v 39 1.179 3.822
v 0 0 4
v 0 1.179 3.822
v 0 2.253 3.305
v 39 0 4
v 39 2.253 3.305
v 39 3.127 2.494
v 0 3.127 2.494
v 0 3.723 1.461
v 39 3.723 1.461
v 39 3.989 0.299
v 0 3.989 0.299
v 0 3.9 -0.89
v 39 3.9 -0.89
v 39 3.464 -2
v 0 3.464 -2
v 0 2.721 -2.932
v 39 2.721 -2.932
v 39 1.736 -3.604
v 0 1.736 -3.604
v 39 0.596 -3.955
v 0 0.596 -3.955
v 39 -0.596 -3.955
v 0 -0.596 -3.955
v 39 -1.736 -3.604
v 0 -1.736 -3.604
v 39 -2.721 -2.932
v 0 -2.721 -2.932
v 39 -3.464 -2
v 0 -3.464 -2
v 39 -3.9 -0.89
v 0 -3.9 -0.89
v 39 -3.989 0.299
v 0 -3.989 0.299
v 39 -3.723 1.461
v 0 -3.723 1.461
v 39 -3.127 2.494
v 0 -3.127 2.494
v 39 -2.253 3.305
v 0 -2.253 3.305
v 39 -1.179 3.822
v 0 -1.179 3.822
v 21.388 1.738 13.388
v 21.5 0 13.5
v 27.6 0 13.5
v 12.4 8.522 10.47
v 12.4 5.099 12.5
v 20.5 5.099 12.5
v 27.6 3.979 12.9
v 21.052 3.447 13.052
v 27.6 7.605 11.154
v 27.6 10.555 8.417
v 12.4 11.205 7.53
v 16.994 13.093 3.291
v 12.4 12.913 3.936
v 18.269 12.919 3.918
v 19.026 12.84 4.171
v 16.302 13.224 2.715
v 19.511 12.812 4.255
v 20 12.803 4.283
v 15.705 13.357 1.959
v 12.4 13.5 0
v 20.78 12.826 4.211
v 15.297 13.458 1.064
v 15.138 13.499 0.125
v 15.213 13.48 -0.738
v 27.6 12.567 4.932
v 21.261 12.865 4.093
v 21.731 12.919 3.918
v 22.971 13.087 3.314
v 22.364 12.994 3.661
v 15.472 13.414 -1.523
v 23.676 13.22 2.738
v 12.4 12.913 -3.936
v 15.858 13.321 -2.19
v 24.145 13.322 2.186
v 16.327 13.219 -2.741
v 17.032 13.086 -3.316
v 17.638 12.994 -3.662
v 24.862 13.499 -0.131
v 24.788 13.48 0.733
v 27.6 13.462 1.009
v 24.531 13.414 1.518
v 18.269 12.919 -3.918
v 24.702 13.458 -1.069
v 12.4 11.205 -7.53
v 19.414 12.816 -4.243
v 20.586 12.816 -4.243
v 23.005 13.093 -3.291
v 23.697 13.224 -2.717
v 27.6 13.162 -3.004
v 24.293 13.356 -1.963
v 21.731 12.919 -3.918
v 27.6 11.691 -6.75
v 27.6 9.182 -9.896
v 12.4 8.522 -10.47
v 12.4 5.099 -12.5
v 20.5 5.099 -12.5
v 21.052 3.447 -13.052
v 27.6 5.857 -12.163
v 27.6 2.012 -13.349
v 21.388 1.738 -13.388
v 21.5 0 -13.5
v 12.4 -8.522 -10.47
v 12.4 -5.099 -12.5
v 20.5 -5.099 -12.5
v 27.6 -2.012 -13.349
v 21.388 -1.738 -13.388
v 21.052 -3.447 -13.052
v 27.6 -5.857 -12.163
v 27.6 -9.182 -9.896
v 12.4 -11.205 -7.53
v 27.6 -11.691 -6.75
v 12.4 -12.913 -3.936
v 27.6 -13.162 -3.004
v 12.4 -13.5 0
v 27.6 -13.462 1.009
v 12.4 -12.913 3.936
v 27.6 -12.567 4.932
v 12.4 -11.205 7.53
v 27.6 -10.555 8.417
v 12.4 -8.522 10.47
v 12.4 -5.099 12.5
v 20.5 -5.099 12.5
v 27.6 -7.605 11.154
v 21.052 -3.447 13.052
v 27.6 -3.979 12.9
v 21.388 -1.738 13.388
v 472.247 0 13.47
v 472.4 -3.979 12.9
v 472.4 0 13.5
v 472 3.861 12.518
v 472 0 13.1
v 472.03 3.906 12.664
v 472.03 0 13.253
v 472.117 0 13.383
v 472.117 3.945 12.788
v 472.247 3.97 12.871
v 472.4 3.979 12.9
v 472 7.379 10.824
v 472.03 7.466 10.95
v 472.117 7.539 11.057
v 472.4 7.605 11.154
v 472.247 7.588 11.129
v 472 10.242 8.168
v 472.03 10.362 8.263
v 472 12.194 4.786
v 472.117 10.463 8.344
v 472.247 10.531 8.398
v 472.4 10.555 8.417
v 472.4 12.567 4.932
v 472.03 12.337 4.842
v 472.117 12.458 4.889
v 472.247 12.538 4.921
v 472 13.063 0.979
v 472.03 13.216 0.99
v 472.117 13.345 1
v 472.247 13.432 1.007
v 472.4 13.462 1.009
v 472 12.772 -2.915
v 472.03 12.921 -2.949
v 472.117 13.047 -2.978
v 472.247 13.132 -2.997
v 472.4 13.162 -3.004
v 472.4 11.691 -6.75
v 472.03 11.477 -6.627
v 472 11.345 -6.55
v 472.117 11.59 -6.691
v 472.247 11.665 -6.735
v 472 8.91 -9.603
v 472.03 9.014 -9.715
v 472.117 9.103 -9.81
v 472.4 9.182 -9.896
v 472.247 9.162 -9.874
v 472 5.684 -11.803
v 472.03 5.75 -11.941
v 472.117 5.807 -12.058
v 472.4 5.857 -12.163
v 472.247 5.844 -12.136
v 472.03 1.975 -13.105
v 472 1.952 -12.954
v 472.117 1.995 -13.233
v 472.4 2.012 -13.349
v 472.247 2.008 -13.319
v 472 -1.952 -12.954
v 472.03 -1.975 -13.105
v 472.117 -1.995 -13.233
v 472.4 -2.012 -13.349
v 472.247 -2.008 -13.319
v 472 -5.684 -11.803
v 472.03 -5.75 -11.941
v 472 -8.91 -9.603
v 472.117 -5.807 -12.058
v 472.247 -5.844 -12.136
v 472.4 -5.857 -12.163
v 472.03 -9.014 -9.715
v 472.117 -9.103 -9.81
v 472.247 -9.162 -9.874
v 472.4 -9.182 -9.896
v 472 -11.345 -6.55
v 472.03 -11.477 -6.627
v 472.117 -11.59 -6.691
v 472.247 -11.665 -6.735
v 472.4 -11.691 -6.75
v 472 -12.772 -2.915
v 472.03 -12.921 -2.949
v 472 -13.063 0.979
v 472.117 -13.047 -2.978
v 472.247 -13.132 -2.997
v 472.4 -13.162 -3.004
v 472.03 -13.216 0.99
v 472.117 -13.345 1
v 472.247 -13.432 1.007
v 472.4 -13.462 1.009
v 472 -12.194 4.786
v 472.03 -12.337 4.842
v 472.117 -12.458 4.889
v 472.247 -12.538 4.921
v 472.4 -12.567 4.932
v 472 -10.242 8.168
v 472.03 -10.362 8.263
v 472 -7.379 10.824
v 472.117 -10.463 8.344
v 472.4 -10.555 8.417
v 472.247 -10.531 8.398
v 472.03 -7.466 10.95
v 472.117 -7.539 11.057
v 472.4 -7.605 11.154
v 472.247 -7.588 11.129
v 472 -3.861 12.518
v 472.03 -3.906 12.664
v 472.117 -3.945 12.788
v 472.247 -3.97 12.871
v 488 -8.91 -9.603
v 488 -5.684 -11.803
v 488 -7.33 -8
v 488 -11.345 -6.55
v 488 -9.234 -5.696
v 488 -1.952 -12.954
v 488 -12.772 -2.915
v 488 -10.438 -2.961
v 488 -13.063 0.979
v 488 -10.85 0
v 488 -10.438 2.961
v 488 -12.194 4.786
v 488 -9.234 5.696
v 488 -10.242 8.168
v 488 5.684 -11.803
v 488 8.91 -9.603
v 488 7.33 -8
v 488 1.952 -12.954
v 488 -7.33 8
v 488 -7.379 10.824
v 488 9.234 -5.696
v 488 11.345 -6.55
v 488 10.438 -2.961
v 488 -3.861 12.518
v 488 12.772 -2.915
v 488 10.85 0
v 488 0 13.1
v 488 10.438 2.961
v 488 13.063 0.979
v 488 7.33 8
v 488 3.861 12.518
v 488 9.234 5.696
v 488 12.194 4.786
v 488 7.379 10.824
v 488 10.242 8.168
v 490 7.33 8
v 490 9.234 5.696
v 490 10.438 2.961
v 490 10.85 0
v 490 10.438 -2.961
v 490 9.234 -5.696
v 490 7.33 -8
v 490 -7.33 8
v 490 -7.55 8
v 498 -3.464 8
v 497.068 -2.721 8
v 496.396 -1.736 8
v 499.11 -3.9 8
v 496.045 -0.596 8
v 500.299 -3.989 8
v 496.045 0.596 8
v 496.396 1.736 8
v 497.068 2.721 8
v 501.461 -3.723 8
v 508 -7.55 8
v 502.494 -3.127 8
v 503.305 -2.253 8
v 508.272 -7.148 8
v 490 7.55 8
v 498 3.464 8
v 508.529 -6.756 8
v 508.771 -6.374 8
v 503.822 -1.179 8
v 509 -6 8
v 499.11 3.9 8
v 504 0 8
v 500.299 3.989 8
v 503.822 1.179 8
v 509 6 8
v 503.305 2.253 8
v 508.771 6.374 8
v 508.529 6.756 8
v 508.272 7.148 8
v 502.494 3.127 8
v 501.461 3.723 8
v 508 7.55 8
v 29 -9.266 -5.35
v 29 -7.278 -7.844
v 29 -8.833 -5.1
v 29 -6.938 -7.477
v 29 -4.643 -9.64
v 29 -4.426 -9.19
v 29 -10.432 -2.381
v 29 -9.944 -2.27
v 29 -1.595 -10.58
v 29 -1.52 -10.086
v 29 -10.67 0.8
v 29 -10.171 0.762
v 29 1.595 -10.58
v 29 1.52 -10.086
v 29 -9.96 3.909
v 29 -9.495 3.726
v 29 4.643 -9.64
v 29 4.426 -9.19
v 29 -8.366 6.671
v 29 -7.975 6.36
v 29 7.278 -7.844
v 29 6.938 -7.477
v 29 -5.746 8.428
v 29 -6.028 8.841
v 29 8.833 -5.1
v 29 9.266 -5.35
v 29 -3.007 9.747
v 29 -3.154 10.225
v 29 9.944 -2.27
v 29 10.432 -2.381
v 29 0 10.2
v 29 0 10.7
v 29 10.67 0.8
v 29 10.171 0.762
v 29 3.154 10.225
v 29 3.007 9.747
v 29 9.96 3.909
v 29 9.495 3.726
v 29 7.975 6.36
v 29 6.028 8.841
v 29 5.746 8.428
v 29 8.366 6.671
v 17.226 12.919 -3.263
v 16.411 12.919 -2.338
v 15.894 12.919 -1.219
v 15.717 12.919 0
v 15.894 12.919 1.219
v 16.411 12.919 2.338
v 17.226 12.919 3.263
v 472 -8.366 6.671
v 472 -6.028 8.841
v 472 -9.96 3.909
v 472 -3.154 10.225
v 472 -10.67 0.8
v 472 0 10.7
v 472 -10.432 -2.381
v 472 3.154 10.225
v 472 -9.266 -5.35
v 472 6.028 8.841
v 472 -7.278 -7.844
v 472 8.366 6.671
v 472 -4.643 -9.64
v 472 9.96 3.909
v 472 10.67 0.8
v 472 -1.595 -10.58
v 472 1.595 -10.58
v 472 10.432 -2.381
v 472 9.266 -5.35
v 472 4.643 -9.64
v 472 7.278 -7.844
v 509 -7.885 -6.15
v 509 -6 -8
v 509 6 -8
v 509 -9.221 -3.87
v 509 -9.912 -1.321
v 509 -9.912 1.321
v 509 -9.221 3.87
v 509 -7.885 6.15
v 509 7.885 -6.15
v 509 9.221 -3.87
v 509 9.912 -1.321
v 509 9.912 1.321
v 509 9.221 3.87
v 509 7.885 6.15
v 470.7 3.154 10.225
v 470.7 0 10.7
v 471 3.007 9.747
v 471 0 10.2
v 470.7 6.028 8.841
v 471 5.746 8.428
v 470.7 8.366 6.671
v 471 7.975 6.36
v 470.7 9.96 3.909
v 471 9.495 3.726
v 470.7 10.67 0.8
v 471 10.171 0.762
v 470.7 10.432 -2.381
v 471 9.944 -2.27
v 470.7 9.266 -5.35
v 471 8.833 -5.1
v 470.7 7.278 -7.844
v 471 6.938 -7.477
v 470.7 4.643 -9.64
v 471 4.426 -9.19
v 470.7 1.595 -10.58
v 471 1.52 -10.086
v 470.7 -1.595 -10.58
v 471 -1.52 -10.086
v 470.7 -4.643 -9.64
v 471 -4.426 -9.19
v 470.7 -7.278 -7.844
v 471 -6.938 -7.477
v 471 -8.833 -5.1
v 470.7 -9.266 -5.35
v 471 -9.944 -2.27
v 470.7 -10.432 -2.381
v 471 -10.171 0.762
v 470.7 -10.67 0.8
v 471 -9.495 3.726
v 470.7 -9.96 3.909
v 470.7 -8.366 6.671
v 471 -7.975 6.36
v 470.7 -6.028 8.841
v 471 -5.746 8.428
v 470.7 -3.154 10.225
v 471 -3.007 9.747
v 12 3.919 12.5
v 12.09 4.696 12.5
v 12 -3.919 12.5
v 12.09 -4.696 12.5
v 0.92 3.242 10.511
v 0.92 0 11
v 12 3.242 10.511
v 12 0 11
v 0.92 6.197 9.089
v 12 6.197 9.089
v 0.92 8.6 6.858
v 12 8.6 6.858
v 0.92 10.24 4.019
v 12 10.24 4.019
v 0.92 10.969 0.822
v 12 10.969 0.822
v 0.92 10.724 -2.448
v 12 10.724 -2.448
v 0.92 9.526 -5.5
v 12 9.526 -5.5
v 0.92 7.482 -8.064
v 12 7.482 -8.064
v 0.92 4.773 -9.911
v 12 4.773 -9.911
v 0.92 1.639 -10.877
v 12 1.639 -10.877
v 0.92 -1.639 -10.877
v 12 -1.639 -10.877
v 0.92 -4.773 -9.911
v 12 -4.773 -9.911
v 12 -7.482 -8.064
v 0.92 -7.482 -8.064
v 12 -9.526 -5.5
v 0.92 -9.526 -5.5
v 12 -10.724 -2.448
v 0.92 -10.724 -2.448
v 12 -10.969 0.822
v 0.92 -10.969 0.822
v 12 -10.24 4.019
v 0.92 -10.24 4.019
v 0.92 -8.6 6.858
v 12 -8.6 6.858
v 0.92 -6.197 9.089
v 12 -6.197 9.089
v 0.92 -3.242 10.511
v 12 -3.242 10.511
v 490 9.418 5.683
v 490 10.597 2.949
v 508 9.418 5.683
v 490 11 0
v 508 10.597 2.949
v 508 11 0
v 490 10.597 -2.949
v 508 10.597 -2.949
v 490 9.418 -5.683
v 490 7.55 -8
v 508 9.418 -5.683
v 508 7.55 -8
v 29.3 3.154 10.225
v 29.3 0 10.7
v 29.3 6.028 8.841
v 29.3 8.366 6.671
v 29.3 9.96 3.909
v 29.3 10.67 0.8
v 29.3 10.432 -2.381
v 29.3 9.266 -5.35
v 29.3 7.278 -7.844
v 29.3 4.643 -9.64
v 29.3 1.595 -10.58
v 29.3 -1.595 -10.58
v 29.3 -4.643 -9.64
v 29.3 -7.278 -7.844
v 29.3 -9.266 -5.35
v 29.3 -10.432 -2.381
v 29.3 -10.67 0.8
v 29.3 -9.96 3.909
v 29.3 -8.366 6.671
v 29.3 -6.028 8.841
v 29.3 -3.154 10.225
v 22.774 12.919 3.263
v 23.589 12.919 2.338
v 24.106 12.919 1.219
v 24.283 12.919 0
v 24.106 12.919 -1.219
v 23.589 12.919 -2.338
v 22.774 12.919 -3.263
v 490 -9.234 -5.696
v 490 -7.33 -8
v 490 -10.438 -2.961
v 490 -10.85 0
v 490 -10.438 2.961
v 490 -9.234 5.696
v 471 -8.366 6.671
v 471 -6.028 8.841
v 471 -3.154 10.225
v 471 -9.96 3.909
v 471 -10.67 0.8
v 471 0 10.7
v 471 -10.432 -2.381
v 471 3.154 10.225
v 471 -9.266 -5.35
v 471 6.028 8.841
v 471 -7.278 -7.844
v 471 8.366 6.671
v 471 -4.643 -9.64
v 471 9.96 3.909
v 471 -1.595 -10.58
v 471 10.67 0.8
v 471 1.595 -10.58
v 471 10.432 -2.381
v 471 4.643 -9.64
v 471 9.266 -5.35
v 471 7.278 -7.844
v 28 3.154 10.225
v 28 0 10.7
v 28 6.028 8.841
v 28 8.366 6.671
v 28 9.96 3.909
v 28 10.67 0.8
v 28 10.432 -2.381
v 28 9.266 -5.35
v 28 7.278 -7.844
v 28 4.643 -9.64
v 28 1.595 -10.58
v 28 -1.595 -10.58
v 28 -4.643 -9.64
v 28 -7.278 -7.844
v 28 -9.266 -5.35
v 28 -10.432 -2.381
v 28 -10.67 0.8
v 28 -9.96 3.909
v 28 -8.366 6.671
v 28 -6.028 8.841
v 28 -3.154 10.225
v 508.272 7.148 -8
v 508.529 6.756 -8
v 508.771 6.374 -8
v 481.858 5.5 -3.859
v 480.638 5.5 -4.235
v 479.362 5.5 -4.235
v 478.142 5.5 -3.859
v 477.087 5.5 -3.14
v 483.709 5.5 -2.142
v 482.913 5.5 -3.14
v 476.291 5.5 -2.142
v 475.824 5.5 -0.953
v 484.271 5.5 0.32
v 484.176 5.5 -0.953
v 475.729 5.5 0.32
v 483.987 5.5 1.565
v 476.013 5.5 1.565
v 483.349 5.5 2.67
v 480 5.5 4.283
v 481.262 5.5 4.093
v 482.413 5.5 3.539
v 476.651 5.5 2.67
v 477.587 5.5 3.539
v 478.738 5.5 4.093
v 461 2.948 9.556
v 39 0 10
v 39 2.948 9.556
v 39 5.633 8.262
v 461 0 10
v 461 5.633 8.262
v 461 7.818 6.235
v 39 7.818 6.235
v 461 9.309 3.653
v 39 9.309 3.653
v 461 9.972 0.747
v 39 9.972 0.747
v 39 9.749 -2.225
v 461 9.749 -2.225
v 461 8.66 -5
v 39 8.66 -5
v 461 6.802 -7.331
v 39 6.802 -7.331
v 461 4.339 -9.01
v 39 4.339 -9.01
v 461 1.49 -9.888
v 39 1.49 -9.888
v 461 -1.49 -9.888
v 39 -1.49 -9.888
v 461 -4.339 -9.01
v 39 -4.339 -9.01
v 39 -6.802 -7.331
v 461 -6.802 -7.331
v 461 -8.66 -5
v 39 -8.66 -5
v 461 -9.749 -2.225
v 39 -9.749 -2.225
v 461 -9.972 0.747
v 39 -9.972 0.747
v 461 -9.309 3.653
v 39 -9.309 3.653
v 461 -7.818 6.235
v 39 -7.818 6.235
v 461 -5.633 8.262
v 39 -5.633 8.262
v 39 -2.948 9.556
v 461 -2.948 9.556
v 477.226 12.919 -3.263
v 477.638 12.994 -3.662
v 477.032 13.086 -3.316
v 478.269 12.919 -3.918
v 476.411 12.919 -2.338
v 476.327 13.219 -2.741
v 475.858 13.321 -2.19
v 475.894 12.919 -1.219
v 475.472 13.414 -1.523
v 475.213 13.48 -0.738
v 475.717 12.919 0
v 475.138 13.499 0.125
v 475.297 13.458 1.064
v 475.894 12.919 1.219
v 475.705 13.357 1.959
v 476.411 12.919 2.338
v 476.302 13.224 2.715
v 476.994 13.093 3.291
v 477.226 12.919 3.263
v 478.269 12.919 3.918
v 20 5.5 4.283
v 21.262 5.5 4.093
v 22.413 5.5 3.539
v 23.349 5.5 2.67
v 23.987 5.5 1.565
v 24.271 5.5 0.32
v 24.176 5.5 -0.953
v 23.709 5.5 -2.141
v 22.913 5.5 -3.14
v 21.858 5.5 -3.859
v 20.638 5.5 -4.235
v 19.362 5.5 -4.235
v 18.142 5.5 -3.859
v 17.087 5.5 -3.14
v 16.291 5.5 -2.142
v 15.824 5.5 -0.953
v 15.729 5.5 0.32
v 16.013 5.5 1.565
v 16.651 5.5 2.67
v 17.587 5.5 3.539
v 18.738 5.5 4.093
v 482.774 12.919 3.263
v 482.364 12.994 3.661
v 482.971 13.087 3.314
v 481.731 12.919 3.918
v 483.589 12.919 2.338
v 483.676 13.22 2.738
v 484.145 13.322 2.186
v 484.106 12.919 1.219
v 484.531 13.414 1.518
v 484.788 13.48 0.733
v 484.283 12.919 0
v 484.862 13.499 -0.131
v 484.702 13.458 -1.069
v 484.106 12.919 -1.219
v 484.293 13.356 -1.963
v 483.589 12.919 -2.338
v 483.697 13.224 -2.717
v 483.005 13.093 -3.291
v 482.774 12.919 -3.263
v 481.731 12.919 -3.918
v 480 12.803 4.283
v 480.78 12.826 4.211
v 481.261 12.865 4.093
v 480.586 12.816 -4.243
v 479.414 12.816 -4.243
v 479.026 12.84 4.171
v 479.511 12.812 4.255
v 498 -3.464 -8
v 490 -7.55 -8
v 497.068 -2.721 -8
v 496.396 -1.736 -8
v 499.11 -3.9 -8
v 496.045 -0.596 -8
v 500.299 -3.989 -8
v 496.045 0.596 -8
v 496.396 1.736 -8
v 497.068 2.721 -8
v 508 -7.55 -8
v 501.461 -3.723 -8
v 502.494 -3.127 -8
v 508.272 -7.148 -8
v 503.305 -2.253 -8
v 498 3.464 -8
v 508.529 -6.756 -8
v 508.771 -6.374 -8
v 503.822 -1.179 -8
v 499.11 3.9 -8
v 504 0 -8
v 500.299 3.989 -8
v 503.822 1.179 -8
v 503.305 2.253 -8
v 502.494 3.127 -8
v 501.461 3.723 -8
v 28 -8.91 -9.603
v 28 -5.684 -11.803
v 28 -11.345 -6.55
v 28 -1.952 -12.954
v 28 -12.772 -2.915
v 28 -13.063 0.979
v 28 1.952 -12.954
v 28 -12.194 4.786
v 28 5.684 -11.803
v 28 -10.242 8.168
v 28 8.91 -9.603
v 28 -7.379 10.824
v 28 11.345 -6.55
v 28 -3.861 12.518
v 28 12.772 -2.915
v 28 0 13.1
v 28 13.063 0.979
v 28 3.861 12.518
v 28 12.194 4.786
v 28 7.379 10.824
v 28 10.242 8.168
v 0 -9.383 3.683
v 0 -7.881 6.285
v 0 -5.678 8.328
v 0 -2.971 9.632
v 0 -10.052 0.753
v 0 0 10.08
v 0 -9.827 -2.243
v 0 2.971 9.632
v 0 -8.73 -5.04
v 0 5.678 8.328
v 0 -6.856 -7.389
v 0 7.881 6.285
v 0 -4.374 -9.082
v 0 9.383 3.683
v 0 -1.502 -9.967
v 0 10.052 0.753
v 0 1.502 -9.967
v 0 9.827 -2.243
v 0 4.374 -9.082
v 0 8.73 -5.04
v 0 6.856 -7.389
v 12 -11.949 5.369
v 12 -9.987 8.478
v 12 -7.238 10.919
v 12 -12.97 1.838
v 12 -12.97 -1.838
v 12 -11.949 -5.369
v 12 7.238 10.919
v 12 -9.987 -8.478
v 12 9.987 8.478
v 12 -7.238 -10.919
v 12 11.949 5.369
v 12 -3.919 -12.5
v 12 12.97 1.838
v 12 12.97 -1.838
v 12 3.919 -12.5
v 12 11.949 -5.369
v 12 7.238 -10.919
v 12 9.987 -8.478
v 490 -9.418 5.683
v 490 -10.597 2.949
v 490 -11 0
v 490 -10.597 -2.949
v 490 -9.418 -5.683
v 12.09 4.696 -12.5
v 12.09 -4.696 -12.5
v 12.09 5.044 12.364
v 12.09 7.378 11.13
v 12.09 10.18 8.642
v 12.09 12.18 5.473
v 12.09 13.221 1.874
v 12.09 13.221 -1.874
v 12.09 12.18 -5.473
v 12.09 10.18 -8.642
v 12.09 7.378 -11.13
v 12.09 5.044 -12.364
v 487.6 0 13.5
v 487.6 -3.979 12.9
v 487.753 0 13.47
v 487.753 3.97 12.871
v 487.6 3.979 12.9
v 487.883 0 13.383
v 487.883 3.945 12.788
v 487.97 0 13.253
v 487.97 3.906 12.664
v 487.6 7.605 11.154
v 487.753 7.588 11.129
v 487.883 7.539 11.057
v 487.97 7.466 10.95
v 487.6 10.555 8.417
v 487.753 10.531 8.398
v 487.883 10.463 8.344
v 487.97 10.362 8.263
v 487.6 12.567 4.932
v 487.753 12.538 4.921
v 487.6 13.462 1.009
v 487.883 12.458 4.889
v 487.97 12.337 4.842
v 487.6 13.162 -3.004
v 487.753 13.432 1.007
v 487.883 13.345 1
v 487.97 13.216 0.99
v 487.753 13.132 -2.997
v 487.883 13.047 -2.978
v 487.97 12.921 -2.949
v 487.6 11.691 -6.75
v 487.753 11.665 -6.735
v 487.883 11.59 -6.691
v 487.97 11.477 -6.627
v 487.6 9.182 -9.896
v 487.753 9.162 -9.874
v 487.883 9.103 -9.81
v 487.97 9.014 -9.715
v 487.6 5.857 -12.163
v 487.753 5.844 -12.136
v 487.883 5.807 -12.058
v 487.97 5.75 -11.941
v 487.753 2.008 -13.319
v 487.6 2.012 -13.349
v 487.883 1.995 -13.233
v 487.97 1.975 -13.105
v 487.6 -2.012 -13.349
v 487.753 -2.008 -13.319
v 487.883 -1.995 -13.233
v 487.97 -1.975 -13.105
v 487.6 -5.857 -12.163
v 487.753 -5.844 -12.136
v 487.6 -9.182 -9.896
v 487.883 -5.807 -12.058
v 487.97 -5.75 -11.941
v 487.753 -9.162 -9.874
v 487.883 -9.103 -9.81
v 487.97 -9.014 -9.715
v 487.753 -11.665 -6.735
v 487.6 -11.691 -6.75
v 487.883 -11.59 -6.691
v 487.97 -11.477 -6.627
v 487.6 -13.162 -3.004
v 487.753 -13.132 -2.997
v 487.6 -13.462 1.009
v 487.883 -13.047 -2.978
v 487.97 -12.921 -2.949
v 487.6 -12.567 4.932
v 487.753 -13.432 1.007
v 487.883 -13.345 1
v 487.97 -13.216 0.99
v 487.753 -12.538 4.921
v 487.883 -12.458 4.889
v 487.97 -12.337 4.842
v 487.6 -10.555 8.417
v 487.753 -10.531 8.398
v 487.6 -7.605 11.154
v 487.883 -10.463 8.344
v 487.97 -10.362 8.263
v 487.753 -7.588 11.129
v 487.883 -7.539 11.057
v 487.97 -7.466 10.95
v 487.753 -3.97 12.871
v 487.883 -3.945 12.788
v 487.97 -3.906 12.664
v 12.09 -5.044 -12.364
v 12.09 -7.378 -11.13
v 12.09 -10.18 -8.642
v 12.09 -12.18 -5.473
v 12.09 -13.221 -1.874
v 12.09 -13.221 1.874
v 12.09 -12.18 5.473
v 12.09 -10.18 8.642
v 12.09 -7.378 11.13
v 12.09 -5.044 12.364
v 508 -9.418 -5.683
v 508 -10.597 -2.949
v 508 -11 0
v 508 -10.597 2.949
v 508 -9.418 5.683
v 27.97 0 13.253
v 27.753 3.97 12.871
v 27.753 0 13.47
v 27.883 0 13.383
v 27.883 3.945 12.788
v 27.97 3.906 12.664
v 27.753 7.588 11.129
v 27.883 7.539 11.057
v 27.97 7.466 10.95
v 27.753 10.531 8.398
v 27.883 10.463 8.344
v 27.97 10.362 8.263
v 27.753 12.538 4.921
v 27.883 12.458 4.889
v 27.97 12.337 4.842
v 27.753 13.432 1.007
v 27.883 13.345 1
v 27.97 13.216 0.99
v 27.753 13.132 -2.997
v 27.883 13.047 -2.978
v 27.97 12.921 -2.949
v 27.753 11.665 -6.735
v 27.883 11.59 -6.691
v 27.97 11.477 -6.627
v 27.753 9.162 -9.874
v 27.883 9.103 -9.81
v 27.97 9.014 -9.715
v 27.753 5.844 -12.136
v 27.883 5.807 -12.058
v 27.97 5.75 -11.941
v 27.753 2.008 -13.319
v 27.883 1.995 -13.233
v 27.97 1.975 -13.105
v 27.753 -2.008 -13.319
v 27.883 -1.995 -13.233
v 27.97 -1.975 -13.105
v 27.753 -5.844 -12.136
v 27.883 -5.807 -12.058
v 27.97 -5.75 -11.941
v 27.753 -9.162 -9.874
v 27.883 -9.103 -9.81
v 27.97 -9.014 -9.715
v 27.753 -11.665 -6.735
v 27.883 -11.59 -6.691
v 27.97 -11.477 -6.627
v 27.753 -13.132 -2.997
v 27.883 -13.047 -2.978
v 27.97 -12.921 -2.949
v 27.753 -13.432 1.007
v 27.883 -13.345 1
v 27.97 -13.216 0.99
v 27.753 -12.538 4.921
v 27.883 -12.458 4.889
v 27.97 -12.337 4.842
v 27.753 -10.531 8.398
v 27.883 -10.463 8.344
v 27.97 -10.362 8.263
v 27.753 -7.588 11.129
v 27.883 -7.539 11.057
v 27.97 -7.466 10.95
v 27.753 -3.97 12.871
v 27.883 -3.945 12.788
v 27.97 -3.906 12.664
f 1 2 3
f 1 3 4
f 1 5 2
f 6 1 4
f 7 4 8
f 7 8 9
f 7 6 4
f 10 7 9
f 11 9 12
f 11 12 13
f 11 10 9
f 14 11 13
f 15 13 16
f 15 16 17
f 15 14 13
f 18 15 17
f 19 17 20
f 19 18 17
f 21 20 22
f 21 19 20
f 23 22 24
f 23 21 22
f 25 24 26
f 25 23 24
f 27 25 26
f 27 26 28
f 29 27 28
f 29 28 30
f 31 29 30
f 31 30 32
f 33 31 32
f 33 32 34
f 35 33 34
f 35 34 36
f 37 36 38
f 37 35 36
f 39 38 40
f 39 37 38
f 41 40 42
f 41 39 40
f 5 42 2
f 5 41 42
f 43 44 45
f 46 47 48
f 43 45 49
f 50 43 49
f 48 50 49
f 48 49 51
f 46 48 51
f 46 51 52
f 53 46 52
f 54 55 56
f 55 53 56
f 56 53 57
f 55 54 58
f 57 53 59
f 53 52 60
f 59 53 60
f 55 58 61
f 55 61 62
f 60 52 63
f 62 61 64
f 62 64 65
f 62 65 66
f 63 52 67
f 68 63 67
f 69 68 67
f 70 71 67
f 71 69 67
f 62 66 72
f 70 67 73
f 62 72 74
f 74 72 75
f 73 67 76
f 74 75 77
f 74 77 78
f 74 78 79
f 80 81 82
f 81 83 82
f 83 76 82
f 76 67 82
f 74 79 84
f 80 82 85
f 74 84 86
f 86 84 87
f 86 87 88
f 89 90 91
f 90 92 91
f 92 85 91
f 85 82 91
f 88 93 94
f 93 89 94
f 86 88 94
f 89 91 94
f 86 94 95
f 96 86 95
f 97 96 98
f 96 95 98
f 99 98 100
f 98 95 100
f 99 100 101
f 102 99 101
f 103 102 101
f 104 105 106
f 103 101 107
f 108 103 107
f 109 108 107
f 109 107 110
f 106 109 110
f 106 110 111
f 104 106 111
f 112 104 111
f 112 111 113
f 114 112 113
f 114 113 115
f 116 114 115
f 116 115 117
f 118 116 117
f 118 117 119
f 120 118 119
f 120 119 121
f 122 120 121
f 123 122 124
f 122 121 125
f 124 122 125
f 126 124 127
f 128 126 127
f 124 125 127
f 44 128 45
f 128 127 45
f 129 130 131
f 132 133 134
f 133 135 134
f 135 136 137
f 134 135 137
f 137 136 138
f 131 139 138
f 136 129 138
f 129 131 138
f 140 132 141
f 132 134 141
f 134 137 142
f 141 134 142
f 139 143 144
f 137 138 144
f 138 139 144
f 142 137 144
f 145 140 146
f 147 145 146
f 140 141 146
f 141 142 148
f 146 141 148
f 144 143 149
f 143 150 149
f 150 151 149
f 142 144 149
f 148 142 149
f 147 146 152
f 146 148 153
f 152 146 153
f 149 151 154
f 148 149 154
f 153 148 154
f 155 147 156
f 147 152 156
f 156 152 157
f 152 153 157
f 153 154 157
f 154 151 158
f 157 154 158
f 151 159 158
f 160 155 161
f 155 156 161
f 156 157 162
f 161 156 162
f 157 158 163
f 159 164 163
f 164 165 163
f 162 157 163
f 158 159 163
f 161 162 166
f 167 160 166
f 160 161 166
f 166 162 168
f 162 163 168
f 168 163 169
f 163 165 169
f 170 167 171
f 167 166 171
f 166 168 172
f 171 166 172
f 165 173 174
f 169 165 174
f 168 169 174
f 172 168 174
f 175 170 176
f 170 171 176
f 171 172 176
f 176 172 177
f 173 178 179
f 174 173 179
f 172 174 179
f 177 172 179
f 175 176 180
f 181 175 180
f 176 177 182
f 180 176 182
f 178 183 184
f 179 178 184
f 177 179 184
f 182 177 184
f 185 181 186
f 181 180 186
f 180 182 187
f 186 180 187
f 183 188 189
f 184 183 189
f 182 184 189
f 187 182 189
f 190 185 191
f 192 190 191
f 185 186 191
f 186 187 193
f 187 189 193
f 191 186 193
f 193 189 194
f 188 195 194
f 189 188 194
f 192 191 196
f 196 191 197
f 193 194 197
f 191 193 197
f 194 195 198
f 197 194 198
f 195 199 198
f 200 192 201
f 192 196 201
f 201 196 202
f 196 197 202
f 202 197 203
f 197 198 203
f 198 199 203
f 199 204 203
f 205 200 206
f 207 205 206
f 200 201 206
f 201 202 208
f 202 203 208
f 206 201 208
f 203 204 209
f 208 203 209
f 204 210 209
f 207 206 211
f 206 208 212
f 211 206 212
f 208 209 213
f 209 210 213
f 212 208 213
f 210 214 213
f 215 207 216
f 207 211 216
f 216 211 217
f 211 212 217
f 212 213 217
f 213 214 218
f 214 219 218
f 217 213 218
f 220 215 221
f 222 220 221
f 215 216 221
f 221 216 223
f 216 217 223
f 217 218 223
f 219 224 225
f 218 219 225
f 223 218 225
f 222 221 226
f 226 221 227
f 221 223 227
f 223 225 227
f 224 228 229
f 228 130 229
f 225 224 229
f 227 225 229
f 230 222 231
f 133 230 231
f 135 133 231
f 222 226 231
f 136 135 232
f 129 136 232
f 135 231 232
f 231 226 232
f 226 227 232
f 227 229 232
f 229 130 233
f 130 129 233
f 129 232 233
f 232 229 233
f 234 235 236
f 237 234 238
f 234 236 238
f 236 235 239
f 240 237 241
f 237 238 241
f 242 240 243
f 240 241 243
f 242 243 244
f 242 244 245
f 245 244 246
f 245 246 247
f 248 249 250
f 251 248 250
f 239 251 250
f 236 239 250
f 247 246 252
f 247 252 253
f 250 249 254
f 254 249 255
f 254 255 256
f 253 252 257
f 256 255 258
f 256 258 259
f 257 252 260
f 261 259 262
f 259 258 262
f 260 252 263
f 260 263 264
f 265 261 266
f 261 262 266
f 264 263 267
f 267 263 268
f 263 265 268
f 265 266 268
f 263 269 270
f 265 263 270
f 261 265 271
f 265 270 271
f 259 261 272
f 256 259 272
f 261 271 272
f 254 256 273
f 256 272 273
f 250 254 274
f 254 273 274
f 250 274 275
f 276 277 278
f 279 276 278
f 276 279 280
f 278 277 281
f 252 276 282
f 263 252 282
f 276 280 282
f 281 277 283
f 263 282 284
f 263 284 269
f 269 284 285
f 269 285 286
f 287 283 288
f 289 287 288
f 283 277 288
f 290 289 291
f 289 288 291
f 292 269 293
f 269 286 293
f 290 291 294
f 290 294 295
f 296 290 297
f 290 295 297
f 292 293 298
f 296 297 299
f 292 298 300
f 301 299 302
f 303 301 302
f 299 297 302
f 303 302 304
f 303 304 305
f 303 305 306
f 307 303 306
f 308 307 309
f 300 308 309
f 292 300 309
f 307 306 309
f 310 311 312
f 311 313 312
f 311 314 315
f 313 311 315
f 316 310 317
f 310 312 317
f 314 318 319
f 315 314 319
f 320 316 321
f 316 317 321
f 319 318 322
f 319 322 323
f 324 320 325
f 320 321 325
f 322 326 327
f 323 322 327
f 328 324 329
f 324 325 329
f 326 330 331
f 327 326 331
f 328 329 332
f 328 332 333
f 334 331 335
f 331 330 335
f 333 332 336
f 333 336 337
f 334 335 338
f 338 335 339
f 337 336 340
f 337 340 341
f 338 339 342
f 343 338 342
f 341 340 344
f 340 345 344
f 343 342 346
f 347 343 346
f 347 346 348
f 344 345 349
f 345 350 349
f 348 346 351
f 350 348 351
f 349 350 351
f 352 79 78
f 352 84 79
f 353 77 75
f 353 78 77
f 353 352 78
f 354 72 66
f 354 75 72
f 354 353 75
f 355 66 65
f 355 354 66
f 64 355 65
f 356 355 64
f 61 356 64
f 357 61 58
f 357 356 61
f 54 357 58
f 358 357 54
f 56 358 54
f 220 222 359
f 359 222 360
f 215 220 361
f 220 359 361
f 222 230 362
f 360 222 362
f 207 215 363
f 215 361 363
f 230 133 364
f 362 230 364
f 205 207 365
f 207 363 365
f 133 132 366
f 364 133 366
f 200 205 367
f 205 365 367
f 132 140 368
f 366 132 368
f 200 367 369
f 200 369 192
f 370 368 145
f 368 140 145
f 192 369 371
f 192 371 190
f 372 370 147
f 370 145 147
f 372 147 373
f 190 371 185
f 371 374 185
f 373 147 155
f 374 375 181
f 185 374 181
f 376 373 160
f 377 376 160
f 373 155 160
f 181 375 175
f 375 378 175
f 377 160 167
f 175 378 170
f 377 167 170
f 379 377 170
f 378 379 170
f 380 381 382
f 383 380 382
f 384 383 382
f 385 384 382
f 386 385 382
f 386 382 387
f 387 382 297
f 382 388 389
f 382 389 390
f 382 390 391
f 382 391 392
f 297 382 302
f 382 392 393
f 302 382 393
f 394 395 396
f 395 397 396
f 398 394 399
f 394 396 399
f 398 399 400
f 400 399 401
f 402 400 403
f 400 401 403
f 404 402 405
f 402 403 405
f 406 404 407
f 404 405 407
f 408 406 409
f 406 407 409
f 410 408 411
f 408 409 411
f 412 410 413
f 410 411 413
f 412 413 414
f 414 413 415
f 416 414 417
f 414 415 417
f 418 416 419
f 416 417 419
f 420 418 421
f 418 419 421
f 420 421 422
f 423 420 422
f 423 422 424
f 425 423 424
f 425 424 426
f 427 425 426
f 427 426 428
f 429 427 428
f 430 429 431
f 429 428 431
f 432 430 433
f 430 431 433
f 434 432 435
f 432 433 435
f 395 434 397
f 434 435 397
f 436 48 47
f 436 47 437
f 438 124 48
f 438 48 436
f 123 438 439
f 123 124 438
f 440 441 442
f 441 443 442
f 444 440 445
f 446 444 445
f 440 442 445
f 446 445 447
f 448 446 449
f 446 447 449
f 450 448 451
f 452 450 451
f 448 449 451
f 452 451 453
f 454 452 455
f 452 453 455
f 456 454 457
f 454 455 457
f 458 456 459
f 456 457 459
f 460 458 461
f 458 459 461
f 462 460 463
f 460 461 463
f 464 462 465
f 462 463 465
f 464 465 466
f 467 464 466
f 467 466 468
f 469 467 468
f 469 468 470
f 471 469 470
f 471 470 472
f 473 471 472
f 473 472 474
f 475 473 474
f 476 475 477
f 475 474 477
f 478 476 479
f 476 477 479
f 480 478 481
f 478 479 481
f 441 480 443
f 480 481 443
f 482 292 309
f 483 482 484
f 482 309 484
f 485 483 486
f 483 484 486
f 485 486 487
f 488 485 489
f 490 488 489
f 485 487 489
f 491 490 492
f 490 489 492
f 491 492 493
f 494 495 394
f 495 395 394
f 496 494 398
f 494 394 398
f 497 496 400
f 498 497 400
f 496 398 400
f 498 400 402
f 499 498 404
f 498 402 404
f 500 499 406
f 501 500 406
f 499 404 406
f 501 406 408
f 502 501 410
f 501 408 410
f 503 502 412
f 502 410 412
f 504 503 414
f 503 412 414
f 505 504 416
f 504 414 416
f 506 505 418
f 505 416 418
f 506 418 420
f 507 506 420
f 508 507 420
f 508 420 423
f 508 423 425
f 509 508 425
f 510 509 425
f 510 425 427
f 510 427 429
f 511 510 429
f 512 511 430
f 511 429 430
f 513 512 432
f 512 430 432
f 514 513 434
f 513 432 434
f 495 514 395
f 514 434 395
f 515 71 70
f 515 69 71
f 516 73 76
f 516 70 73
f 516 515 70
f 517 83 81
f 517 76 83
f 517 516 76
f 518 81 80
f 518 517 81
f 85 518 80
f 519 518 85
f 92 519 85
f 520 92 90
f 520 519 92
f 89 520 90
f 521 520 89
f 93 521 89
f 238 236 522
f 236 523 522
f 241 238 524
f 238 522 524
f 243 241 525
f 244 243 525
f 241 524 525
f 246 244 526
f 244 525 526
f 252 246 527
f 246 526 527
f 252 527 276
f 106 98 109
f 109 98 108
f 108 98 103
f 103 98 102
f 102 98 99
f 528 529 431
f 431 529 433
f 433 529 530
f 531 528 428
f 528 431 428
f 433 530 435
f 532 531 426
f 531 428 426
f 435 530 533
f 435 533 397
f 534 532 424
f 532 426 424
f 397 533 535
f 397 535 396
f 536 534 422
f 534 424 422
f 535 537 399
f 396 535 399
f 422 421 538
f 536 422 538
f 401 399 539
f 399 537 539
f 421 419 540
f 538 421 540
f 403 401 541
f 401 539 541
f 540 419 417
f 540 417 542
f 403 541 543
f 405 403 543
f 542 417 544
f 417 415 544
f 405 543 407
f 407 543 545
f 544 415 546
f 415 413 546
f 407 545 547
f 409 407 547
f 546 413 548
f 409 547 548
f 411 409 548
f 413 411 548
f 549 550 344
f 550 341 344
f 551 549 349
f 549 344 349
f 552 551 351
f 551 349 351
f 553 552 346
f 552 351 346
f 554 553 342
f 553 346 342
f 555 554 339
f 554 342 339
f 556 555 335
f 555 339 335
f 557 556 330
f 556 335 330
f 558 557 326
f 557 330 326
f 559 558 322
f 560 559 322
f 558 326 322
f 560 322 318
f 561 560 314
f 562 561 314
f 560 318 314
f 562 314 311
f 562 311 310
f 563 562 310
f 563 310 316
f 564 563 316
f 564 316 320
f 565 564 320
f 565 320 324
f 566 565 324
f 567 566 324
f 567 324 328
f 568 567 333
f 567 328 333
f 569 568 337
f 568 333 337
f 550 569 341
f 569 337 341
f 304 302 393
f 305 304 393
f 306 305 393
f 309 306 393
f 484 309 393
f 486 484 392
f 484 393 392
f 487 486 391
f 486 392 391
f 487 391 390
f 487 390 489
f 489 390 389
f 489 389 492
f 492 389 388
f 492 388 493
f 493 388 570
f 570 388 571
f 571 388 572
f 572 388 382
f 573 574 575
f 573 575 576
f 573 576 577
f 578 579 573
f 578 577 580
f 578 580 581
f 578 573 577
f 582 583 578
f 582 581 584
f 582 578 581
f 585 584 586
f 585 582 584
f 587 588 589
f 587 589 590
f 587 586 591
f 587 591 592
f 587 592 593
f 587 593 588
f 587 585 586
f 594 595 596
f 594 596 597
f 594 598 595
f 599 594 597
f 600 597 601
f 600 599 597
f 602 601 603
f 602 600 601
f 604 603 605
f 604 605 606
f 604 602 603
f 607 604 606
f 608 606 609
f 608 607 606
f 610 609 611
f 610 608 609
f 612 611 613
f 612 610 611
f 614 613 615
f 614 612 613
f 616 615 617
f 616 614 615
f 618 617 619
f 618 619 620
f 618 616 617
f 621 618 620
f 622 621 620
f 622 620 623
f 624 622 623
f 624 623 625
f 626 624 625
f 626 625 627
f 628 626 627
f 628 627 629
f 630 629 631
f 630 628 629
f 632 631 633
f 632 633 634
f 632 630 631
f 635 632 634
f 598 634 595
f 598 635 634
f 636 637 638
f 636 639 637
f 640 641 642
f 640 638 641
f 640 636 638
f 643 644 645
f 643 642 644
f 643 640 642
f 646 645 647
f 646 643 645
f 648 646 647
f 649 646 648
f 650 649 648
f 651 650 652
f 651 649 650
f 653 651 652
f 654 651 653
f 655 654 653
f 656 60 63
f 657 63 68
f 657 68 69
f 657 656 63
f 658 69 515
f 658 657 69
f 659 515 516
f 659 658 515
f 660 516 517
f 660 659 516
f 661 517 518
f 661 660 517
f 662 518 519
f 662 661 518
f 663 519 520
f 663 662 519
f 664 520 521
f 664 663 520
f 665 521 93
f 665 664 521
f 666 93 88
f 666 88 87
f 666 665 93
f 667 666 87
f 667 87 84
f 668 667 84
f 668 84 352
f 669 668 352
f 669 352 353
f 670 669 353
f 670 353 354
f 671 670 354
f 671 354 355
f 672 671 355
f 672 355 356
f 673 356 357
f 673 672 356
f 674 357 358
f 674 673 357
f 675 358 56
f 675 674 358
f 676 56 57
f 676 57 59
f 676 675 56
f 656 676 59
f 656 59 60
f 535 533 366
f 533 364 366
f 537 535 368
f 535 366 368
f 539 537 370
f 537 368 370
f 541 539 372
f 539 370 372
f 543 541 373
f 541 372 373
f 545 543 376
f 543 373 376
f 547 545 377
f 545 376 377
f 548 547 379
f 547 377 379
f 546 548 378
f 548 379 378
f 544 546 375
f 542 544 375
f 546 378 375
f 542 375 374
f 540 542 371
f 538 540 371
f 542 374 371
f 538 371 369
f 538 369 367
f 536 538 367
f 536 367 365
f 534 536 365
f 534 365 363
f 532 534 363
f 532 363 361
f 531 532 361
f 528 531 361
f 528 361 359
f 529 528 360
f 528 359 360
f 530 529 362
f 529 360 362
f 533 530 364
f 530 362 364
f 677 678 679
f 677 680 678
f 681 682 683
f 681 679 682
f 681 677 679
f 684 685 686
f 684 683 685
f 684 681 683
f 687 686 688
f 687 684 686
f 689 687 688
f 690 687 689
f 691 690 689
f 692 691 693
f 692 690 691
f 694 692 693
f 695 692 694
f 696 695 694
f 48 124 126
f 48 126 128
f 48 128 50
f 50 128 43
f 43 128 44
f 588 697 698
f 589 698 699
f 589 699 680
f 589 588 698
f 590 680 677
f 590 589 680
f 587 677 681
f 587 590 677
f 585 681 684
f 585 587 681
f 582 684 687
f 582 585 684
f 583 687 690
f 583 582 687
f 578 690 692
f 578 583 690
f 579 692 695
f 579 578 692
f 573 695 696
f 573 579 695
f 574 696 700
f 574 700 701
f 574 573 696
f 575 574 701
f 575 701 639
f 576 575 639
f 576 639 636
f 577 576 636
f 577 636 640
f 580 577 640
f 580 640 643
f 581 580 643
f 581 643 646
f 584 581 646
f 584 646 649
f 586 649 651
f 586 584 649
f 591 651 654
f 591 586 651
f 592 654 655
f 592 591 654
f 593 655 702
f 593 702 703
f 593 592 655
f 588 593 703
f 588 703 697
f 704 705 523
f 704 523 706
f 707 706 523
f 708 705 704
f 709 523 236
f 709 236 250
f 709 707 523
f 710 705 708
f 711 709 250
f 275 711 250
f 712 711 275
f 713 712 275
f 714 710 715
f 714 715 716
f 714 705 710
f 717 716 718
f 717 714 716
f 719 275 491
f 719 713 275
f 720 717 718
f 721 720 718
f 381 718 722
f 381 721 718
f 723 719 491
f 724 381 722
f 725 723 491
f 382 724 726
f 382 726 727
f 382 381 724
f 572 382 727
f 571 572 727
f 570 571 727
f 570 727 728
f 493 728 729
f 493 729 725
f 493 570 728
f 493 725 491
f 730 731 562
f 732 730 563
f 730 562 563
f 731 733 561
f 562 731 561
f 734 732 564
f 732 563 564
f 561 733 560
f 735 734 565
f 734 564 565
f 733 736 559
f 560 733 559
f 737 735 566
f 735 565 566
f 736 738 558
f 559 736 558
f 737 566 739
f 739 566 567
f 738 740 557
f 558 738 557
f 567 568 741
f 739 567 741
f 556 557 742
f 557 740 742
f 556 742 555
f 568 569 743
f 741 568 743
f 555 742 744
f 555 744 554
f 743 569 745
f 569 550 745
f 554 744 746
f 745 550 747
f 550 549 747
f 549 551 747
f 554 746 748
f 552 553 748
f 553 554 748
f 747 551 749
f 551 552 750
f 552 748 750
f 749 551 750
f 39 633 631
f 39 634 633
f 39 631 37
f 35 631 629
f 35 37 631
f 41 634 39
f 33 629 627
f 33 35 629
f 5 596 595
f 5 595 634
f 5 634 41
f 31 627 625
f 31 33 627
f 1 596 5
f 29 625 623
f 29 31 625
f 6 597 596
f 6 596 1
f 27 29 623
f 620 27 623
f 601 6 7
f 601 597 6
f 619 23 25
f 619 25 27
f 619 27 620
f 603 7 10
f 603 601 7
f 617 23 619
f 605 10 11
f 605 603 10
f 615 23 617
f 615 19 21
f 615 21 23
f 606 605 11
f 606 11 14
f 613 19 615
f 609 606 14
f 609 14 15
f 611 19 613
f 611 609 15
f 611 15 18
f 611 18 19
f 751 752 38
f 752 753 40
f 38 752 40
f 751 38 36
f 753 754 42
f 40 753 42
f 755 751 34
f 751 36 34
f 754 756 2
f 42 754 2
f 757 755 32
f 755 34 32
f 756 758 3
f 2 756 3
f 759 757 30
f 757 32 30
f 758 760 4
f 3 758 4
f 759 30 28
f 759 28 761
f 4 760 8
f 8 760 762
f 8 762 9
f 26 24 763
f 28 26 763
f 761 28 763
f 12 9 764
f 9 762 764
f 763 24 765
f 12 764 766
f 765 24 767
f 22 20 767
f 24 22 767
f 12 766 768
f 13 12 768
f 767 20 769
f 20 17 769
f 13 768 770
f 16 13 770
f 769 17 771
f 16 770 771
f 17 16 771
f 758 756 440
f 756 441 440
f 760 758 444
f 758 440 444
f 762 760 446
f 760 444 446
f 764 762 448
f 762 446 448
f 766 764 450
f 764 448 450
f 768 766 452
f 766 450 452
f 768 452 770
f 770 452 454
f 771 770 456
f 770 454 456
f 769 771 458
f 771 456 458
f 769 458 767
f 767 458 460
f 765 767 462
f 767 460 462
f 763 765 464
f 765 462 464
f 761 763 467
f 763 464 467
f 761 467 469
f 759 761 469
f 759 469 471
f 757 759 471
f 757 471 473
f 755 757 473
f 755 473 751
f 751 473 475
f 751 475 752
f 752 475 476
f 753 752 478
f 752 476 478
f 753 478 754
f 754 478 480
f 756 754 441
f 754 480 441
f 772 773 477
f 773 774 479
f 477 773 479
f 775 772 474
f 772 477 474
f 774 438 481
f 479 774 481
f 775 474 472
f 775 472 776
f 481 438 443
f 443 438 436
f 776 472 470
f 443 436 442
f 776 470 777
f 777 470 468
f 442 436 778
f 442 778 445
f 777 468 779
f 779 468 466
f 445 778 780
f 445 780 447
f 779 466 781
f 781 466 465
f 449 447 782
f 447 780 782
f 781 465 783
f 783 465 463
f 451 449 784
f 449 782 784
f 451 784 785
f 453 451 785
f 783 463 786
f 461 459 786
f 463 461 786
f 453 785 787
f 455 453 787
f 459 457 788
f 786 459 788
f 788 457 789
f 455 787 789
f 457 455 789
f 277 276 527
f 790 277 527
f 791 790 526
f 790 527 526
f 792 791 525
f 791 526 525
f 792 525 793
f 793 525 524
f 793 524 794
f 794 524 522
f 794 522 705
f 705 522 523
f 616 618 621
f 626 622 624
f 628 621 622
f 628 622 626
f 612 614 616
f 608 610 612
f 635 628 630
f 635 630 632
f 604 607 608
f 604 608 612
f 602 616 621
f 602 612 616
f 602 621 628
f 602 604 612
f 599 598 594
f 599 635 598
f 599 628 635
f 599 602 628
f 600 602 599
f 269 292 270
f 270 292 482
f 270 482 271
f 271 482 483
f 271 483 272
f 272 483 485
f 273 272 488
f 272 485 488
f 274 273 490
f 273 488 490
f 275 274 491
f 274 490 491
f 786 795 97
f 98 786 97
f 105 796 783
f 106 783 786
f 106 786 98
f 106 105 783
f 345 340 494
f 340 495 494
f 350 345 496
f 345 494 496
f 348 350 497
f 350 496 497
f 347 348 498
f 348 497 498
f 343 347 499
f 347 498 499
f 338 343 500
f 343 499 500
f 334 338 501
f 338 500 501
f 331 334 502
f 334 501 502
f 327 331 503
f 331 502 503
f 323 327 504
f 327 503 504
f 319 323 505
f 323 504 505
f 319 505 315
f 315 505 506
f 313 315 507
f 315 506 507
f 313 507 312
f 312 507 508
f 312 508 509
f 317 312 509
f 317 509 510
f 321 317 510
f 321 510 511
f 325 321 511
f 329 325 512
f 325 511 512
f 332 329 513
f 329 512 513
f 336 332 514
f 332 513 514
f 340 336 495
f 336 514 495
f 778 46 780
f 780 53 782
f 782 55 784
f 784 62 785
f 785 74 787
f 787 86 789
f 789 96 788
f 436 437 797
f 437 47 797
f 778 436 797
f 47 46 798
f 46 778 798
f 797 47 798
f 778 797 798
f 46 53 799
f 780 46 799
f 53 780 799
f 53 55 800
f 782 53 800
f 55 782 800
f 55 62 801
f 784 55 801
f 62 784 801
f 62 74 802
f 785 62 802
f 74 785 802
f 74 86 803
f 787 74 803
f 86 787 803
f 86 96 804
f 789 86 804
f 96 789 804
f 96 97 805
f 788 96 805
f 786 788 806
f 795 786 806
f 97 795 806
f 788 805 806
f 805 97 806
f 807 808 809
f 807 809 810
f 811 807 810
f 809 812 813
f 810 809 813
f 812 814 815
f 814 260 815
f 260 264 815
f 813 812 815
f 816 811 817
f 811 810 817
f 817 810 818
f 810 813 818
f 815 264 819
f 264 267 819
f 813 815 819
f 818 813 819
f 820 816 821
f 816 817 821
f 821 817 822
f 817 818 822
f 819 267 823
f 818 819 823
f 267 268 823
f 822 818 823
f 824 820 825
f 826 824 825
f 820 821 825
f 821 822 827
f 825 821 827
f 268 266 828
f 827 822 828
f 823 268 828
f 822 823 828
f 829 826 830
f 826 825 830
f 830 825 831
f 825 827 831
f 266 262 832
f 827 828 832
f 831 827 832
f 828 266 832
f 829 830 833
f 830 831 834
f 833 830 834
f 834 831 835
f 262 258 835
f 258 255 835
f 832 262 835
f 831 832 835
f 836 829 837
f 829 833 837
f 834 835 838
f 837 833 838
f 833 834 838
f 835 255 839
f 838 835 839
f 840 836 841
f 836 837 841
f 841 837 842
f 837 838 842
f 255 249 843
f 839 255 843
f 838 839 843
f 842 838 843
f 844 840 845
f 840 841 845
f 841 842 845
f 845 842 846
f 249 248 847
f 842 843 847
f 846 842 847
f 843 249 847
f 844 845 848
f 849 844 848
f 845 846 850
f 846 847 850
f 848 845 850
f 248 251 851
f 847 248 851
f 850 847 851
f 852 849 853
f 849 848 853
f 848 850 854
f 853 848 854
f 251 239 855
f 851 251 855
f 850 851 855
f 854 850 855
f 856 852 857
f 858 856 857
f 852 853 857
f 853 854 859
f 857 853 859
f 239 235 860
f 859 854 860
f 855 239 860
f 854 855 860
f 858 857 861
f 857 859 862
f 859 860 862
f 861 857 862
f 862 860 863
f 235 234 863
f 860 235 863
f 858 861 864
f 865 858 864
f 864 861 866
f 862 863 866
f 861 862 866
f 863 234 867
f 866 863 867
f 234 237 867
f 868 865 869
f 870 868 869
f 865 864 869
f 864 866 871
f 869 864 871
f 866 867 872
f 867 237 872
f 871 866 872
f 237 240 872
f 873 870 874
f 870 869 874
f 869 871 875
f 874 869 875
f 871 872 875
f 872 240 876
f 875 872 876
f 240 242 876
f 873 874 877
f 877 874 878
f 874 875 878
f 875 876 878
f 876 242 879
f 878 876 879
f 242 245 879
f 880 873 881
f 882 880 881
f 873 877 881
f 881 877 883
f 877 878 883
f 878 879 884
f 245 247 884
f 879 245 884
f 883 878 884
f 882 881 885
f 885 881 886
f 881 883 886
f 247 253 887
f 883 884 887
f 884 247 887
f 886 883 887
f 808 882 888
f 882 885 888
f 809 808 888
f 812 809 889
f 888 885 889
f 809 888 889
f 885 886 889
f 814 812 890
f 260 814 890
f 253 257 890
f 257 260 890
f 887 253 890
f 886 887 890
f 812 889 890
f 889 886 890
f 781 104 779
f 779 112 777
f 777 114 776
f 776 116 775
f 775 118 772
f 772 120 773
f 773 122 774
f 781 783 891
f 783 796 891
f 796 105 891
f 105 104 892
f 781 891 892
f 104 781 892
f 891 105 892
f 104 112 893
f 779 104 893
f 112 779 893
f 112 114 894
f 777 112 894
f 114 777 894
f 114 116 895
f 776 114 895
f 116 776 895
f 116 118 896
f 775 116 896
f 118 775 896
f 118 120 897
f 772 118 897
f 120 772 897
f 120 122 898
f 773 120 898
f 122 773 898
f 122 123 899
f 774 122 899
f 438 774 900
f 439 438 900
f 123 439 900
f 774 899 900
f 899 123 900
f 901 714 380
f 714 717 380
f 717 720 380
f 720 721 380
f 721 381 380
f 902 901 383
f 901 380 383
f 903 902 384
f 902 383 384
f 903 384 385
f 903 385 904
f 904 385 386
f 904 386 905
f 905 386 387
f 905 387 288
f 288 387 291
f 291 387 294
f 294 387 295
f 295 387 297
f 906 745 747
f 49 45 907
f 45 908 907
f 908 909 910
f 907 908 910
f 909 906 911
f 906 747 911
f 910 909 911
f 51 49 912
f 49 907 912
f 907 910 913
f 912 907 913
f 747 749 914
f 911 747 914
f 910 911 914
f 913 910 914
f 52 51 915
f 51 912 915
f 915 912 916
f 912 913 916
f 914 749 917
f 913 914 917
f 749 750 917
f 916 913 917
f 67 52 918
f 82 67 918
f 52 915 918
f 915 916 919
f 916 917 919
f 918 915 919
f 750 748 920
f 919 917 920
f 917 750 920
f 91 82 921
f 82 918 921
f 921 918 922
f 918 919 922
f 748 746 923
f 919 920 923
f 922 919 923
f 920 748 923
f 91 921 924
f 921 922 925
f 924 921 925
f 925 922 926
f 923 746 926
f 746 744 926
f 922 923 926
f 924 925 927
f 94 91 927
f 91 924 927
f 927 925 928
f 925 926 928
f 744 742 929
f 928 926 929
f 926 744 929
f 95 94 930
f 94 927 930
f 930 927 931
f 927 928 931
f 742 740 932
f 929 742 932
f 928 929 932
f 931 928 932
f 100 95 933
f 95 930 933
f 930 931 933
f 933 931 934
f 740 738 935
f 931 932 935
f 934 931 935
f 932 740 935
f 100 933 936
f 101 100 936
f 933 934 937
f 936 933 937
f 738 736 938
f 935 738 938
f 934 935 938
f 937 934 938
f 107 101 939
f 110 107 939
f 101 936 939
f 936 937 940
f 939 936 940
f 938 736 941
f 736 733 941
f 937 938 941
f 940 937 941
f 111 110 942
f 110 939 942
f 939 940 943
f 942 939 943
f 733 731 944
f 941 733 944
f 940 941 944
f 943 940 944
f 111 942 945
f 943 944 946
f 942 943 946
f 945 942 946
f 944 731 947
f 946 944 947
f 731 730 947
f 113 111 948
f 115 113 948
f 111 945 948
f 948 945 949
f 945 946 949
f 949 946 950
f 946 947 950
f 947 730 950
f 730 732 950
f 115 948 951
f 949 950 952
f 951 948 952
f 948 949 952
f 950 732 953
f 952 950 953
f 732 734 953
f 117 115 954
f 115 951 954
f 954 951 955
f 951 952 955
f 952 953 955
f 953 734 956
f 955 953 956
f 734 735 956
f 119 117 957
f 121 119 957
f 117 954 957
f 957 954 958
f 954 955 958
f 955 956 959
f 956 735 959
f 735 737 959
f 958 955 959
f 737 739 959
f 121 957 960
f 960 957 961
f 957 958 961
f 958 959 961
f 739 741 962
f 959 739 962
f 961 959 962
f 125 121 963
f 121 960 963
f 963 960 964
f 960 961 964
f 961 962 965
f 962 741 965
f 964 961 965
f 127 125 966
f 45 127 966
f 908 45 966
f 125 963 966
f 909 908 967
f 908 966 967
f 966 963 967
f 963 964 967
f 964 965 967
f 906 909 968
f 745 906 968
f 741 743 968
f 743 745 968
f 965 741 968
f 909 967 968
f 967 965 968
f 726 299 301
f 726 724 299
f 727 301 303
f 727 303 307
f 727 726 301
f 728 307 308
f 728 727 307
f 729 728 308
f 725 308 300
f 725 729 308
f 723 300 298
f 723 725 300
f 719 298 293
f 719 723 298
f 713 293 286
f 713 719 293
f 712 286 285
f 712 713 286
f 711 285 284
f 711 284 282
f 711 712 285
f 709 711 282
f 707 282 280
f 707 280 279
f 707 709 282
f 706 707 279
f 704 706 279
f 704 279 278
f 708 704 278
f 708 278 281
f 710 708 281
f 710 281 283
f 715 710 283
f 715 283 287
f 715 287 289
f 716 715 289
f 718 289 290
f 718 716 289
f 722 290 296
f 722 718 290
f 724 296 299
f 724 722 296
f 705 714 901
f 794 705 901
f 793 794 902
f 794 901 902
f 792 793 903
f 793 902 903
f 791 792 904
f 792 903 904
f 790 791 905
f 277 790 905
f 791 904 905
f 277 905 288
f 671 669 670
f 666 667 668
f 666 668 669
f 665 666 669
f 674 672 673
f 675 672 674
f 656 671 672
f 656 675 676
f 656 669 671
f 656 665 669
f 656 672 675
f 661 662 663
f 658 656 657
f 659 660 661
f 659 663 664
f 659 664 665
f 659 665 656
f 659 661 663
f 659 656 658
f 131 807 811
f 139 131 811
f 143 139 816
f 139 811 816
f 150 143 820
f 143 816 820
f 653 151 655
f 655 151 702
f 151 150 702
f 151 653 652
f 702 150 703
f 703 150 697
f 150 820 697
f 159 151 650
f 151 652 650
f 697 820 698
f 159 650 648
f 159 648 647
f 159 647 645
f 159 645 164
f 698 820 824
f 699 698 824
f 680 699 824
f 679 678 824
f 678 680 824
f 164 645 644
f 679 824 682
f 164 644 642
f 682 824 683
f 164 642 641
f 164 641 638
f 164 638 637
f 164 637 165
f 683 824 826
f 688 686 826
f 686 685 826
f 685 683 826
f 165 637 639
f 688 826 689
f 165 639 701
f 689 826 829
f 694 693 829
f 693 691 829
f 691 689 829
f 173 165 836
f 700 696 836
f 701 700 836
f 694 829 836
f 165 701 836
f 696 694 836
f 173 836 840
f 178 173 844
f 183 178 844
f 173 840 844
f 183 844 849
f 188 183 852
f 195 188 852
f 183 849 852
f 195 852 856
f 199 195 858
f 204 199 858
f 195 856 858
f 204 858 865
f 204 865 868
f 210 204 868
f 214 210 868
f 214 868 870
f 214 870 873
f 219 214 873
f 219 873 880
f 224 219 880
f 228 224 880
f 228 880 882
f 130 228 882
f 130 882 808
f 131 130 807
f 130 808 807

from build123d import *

# Parameters (mm, degrees)
SKETCH_3_W               = 36
SKETCH_3_H               = 42
SKETCH_3_W_2             = 16
SKETCH_3_H_2             = 22
CUT_EXTRUDE_1_DEPTH      = 21
SKETCH_4_W               = 16
SKETCH_4_H               = 4
CUT_EXTRUDE_2_DEPTH      = 27
CUT_EXTRUDE_2_DEPTH_BACK = 27


with BuildPart() as part:
    # 草图1 → 旋转1 (revolve)
    with BuildSketch(Plane.XY):
        with BuildLine():
            Line((0, 0), (0, 10.08))
            Line((0, 10.08), (0.92, 11))
            Line((0.92, 11), (12, 11))
            Line((12, 11), (12, 13.1))
            ThreePointArc((12, 13.1), (12.117157288, 13.382842712), (12.4, 13.5))
            Line((12.4, 13.5), (27.6, 13.5))
            ThreePointArc((27.6, 13.5), (27.882842712, 13.382842712), (28, 13.1))
            Line((28, 13.1), (28, 10.7))
            Line((28, 10.7), (29, 10.7))
            Line((29, 10.7), (29, 10.2))
            Line((29, 10.2), (29.3, 10.7))
            Line((29.3, 10.7), (470.7, 10.7))
            Line((470.7, 10.7), (471, 10.2))
            Line((471, 10.2), (471, 10.7))
            Line((471, 10.7), (472, 10.7))
            Line((472, 10.7), (472, 13.1))
            ThreePointArc((472, 13.1), (472.117157288, 13.382842712), (472.4, 13.5))
            Line((472.4, 13.5), (487.6, 13.5))
            ThreePointArc((487.6, 13.5), (487.882842712, 13.382842712), (488, 13.1))
            Line((488, 13.1), (488, 0))
            Line((488, 0), (0, 0))
        make_face()
    revolve(axis=Axis((488, 0, 0), (-1, 0, 0)))

    # 草图2 → 旋转2 (revolve)
    with BuildSketch(Plane.XY):
        Polygon((488, 0), (488, 10.85), (490, 10.85), (490, 11), (508, 11), (509, 10), (509, 0), align=None)
    revolve(axis=Axis((509, 0, 0), (-1, 0, 0)))

    # 草图3 → 切除-拉伸1 (cut)
    with BuildSketch(Plane(origin=(509, 0, 0), x_dir=(0, 0, -1), z_dir=(1, 0, 0))):
        Rectangle(SKETCH_3_W, SKETCH_3_H)
        Rectangle(SKETCH_3_W_2, SKETCH_3_H_2, mode=Mode.SUBTRACT)
    extrude(amount=-CUT_EXTRUDE_1_DEPTH, mode=Mode.SUBTRACT)

    # 草图4 → 切除-旋转1 (revolve, cut)
    with BuildSketch(Plane(origin=(500, 0, 0), x_dir=(0, 0, -1), z_dir=(1, 0, 0))):
        with Locations((0, 2)):
            Rectangle(SKETCH_4_W, SKETCH_4_H)
    revolve(axis=Axis((500, 0, -8), (0, 0, 1)), mode=Mode.SUBTRACT)

    # 草图5 → 切除-旋转2 (revolve, cut)
    with BuildSketch(Plane.XY):
        Polygon((20, 13.5), (24.864, 13.5), (24.283, 12.919), (24.283, 5.5), (20, 5.5), align=None)
    revolve(axis=Axis((20, 5.5, 0), (0, 1, 0)), mode=Mode.SUBTRACT)

    # 草图6 → 切除-旋转3 (revolve, cut)
    with BuildSketch(Plane.XY):
        Polygon((480, 13.5), (484.864, 13.5), (484.283, 12.919), (484.283, 5.5), (480, 5.5), align=None)
    revolve(axis=Axis((480, 5.5, 0), (0, 1, 0)), mode=Mode.SUBTRACT)

    # 草图7 → 切除-拉伸2 (cut, two sides: drawn at the far end of the back side and taken through both)
    with BuildSketch(Plane(origin=(0, 0, 0), x_dir=(1, 0, 0), z_dir=(0, 1, 0)).offset(-CUT_EXTRUDE_2_DEPTH_BACK)):
        Polygon((-4, -13.5), (21.5, -13.5), (20.5, -12.5), (-2, -12.5), (-2, 12.5), (20.5, 12.5), (21.5, 13.5), (-4, 13.5), align=None)
    extrude(amount=CUT_EXTRUDE_2_DEPTH + CUT_EXTRUDE_2_DEPTH_BACK, mode=Mode.SUBTRACT)

    # 草图8 → 切除-旋转4 (revolve, cut)
    with BuildSketch(Plane.XY):
        Polygon((0, 0), (0, 4), (39, 4), (39, 10), (461, 10), (461, 0), align=None)
    revolve(axis=Axis((461, 0, 0), (-1, 0, 0)), mode=Mode.SUBTRACT)


solid = part.part
